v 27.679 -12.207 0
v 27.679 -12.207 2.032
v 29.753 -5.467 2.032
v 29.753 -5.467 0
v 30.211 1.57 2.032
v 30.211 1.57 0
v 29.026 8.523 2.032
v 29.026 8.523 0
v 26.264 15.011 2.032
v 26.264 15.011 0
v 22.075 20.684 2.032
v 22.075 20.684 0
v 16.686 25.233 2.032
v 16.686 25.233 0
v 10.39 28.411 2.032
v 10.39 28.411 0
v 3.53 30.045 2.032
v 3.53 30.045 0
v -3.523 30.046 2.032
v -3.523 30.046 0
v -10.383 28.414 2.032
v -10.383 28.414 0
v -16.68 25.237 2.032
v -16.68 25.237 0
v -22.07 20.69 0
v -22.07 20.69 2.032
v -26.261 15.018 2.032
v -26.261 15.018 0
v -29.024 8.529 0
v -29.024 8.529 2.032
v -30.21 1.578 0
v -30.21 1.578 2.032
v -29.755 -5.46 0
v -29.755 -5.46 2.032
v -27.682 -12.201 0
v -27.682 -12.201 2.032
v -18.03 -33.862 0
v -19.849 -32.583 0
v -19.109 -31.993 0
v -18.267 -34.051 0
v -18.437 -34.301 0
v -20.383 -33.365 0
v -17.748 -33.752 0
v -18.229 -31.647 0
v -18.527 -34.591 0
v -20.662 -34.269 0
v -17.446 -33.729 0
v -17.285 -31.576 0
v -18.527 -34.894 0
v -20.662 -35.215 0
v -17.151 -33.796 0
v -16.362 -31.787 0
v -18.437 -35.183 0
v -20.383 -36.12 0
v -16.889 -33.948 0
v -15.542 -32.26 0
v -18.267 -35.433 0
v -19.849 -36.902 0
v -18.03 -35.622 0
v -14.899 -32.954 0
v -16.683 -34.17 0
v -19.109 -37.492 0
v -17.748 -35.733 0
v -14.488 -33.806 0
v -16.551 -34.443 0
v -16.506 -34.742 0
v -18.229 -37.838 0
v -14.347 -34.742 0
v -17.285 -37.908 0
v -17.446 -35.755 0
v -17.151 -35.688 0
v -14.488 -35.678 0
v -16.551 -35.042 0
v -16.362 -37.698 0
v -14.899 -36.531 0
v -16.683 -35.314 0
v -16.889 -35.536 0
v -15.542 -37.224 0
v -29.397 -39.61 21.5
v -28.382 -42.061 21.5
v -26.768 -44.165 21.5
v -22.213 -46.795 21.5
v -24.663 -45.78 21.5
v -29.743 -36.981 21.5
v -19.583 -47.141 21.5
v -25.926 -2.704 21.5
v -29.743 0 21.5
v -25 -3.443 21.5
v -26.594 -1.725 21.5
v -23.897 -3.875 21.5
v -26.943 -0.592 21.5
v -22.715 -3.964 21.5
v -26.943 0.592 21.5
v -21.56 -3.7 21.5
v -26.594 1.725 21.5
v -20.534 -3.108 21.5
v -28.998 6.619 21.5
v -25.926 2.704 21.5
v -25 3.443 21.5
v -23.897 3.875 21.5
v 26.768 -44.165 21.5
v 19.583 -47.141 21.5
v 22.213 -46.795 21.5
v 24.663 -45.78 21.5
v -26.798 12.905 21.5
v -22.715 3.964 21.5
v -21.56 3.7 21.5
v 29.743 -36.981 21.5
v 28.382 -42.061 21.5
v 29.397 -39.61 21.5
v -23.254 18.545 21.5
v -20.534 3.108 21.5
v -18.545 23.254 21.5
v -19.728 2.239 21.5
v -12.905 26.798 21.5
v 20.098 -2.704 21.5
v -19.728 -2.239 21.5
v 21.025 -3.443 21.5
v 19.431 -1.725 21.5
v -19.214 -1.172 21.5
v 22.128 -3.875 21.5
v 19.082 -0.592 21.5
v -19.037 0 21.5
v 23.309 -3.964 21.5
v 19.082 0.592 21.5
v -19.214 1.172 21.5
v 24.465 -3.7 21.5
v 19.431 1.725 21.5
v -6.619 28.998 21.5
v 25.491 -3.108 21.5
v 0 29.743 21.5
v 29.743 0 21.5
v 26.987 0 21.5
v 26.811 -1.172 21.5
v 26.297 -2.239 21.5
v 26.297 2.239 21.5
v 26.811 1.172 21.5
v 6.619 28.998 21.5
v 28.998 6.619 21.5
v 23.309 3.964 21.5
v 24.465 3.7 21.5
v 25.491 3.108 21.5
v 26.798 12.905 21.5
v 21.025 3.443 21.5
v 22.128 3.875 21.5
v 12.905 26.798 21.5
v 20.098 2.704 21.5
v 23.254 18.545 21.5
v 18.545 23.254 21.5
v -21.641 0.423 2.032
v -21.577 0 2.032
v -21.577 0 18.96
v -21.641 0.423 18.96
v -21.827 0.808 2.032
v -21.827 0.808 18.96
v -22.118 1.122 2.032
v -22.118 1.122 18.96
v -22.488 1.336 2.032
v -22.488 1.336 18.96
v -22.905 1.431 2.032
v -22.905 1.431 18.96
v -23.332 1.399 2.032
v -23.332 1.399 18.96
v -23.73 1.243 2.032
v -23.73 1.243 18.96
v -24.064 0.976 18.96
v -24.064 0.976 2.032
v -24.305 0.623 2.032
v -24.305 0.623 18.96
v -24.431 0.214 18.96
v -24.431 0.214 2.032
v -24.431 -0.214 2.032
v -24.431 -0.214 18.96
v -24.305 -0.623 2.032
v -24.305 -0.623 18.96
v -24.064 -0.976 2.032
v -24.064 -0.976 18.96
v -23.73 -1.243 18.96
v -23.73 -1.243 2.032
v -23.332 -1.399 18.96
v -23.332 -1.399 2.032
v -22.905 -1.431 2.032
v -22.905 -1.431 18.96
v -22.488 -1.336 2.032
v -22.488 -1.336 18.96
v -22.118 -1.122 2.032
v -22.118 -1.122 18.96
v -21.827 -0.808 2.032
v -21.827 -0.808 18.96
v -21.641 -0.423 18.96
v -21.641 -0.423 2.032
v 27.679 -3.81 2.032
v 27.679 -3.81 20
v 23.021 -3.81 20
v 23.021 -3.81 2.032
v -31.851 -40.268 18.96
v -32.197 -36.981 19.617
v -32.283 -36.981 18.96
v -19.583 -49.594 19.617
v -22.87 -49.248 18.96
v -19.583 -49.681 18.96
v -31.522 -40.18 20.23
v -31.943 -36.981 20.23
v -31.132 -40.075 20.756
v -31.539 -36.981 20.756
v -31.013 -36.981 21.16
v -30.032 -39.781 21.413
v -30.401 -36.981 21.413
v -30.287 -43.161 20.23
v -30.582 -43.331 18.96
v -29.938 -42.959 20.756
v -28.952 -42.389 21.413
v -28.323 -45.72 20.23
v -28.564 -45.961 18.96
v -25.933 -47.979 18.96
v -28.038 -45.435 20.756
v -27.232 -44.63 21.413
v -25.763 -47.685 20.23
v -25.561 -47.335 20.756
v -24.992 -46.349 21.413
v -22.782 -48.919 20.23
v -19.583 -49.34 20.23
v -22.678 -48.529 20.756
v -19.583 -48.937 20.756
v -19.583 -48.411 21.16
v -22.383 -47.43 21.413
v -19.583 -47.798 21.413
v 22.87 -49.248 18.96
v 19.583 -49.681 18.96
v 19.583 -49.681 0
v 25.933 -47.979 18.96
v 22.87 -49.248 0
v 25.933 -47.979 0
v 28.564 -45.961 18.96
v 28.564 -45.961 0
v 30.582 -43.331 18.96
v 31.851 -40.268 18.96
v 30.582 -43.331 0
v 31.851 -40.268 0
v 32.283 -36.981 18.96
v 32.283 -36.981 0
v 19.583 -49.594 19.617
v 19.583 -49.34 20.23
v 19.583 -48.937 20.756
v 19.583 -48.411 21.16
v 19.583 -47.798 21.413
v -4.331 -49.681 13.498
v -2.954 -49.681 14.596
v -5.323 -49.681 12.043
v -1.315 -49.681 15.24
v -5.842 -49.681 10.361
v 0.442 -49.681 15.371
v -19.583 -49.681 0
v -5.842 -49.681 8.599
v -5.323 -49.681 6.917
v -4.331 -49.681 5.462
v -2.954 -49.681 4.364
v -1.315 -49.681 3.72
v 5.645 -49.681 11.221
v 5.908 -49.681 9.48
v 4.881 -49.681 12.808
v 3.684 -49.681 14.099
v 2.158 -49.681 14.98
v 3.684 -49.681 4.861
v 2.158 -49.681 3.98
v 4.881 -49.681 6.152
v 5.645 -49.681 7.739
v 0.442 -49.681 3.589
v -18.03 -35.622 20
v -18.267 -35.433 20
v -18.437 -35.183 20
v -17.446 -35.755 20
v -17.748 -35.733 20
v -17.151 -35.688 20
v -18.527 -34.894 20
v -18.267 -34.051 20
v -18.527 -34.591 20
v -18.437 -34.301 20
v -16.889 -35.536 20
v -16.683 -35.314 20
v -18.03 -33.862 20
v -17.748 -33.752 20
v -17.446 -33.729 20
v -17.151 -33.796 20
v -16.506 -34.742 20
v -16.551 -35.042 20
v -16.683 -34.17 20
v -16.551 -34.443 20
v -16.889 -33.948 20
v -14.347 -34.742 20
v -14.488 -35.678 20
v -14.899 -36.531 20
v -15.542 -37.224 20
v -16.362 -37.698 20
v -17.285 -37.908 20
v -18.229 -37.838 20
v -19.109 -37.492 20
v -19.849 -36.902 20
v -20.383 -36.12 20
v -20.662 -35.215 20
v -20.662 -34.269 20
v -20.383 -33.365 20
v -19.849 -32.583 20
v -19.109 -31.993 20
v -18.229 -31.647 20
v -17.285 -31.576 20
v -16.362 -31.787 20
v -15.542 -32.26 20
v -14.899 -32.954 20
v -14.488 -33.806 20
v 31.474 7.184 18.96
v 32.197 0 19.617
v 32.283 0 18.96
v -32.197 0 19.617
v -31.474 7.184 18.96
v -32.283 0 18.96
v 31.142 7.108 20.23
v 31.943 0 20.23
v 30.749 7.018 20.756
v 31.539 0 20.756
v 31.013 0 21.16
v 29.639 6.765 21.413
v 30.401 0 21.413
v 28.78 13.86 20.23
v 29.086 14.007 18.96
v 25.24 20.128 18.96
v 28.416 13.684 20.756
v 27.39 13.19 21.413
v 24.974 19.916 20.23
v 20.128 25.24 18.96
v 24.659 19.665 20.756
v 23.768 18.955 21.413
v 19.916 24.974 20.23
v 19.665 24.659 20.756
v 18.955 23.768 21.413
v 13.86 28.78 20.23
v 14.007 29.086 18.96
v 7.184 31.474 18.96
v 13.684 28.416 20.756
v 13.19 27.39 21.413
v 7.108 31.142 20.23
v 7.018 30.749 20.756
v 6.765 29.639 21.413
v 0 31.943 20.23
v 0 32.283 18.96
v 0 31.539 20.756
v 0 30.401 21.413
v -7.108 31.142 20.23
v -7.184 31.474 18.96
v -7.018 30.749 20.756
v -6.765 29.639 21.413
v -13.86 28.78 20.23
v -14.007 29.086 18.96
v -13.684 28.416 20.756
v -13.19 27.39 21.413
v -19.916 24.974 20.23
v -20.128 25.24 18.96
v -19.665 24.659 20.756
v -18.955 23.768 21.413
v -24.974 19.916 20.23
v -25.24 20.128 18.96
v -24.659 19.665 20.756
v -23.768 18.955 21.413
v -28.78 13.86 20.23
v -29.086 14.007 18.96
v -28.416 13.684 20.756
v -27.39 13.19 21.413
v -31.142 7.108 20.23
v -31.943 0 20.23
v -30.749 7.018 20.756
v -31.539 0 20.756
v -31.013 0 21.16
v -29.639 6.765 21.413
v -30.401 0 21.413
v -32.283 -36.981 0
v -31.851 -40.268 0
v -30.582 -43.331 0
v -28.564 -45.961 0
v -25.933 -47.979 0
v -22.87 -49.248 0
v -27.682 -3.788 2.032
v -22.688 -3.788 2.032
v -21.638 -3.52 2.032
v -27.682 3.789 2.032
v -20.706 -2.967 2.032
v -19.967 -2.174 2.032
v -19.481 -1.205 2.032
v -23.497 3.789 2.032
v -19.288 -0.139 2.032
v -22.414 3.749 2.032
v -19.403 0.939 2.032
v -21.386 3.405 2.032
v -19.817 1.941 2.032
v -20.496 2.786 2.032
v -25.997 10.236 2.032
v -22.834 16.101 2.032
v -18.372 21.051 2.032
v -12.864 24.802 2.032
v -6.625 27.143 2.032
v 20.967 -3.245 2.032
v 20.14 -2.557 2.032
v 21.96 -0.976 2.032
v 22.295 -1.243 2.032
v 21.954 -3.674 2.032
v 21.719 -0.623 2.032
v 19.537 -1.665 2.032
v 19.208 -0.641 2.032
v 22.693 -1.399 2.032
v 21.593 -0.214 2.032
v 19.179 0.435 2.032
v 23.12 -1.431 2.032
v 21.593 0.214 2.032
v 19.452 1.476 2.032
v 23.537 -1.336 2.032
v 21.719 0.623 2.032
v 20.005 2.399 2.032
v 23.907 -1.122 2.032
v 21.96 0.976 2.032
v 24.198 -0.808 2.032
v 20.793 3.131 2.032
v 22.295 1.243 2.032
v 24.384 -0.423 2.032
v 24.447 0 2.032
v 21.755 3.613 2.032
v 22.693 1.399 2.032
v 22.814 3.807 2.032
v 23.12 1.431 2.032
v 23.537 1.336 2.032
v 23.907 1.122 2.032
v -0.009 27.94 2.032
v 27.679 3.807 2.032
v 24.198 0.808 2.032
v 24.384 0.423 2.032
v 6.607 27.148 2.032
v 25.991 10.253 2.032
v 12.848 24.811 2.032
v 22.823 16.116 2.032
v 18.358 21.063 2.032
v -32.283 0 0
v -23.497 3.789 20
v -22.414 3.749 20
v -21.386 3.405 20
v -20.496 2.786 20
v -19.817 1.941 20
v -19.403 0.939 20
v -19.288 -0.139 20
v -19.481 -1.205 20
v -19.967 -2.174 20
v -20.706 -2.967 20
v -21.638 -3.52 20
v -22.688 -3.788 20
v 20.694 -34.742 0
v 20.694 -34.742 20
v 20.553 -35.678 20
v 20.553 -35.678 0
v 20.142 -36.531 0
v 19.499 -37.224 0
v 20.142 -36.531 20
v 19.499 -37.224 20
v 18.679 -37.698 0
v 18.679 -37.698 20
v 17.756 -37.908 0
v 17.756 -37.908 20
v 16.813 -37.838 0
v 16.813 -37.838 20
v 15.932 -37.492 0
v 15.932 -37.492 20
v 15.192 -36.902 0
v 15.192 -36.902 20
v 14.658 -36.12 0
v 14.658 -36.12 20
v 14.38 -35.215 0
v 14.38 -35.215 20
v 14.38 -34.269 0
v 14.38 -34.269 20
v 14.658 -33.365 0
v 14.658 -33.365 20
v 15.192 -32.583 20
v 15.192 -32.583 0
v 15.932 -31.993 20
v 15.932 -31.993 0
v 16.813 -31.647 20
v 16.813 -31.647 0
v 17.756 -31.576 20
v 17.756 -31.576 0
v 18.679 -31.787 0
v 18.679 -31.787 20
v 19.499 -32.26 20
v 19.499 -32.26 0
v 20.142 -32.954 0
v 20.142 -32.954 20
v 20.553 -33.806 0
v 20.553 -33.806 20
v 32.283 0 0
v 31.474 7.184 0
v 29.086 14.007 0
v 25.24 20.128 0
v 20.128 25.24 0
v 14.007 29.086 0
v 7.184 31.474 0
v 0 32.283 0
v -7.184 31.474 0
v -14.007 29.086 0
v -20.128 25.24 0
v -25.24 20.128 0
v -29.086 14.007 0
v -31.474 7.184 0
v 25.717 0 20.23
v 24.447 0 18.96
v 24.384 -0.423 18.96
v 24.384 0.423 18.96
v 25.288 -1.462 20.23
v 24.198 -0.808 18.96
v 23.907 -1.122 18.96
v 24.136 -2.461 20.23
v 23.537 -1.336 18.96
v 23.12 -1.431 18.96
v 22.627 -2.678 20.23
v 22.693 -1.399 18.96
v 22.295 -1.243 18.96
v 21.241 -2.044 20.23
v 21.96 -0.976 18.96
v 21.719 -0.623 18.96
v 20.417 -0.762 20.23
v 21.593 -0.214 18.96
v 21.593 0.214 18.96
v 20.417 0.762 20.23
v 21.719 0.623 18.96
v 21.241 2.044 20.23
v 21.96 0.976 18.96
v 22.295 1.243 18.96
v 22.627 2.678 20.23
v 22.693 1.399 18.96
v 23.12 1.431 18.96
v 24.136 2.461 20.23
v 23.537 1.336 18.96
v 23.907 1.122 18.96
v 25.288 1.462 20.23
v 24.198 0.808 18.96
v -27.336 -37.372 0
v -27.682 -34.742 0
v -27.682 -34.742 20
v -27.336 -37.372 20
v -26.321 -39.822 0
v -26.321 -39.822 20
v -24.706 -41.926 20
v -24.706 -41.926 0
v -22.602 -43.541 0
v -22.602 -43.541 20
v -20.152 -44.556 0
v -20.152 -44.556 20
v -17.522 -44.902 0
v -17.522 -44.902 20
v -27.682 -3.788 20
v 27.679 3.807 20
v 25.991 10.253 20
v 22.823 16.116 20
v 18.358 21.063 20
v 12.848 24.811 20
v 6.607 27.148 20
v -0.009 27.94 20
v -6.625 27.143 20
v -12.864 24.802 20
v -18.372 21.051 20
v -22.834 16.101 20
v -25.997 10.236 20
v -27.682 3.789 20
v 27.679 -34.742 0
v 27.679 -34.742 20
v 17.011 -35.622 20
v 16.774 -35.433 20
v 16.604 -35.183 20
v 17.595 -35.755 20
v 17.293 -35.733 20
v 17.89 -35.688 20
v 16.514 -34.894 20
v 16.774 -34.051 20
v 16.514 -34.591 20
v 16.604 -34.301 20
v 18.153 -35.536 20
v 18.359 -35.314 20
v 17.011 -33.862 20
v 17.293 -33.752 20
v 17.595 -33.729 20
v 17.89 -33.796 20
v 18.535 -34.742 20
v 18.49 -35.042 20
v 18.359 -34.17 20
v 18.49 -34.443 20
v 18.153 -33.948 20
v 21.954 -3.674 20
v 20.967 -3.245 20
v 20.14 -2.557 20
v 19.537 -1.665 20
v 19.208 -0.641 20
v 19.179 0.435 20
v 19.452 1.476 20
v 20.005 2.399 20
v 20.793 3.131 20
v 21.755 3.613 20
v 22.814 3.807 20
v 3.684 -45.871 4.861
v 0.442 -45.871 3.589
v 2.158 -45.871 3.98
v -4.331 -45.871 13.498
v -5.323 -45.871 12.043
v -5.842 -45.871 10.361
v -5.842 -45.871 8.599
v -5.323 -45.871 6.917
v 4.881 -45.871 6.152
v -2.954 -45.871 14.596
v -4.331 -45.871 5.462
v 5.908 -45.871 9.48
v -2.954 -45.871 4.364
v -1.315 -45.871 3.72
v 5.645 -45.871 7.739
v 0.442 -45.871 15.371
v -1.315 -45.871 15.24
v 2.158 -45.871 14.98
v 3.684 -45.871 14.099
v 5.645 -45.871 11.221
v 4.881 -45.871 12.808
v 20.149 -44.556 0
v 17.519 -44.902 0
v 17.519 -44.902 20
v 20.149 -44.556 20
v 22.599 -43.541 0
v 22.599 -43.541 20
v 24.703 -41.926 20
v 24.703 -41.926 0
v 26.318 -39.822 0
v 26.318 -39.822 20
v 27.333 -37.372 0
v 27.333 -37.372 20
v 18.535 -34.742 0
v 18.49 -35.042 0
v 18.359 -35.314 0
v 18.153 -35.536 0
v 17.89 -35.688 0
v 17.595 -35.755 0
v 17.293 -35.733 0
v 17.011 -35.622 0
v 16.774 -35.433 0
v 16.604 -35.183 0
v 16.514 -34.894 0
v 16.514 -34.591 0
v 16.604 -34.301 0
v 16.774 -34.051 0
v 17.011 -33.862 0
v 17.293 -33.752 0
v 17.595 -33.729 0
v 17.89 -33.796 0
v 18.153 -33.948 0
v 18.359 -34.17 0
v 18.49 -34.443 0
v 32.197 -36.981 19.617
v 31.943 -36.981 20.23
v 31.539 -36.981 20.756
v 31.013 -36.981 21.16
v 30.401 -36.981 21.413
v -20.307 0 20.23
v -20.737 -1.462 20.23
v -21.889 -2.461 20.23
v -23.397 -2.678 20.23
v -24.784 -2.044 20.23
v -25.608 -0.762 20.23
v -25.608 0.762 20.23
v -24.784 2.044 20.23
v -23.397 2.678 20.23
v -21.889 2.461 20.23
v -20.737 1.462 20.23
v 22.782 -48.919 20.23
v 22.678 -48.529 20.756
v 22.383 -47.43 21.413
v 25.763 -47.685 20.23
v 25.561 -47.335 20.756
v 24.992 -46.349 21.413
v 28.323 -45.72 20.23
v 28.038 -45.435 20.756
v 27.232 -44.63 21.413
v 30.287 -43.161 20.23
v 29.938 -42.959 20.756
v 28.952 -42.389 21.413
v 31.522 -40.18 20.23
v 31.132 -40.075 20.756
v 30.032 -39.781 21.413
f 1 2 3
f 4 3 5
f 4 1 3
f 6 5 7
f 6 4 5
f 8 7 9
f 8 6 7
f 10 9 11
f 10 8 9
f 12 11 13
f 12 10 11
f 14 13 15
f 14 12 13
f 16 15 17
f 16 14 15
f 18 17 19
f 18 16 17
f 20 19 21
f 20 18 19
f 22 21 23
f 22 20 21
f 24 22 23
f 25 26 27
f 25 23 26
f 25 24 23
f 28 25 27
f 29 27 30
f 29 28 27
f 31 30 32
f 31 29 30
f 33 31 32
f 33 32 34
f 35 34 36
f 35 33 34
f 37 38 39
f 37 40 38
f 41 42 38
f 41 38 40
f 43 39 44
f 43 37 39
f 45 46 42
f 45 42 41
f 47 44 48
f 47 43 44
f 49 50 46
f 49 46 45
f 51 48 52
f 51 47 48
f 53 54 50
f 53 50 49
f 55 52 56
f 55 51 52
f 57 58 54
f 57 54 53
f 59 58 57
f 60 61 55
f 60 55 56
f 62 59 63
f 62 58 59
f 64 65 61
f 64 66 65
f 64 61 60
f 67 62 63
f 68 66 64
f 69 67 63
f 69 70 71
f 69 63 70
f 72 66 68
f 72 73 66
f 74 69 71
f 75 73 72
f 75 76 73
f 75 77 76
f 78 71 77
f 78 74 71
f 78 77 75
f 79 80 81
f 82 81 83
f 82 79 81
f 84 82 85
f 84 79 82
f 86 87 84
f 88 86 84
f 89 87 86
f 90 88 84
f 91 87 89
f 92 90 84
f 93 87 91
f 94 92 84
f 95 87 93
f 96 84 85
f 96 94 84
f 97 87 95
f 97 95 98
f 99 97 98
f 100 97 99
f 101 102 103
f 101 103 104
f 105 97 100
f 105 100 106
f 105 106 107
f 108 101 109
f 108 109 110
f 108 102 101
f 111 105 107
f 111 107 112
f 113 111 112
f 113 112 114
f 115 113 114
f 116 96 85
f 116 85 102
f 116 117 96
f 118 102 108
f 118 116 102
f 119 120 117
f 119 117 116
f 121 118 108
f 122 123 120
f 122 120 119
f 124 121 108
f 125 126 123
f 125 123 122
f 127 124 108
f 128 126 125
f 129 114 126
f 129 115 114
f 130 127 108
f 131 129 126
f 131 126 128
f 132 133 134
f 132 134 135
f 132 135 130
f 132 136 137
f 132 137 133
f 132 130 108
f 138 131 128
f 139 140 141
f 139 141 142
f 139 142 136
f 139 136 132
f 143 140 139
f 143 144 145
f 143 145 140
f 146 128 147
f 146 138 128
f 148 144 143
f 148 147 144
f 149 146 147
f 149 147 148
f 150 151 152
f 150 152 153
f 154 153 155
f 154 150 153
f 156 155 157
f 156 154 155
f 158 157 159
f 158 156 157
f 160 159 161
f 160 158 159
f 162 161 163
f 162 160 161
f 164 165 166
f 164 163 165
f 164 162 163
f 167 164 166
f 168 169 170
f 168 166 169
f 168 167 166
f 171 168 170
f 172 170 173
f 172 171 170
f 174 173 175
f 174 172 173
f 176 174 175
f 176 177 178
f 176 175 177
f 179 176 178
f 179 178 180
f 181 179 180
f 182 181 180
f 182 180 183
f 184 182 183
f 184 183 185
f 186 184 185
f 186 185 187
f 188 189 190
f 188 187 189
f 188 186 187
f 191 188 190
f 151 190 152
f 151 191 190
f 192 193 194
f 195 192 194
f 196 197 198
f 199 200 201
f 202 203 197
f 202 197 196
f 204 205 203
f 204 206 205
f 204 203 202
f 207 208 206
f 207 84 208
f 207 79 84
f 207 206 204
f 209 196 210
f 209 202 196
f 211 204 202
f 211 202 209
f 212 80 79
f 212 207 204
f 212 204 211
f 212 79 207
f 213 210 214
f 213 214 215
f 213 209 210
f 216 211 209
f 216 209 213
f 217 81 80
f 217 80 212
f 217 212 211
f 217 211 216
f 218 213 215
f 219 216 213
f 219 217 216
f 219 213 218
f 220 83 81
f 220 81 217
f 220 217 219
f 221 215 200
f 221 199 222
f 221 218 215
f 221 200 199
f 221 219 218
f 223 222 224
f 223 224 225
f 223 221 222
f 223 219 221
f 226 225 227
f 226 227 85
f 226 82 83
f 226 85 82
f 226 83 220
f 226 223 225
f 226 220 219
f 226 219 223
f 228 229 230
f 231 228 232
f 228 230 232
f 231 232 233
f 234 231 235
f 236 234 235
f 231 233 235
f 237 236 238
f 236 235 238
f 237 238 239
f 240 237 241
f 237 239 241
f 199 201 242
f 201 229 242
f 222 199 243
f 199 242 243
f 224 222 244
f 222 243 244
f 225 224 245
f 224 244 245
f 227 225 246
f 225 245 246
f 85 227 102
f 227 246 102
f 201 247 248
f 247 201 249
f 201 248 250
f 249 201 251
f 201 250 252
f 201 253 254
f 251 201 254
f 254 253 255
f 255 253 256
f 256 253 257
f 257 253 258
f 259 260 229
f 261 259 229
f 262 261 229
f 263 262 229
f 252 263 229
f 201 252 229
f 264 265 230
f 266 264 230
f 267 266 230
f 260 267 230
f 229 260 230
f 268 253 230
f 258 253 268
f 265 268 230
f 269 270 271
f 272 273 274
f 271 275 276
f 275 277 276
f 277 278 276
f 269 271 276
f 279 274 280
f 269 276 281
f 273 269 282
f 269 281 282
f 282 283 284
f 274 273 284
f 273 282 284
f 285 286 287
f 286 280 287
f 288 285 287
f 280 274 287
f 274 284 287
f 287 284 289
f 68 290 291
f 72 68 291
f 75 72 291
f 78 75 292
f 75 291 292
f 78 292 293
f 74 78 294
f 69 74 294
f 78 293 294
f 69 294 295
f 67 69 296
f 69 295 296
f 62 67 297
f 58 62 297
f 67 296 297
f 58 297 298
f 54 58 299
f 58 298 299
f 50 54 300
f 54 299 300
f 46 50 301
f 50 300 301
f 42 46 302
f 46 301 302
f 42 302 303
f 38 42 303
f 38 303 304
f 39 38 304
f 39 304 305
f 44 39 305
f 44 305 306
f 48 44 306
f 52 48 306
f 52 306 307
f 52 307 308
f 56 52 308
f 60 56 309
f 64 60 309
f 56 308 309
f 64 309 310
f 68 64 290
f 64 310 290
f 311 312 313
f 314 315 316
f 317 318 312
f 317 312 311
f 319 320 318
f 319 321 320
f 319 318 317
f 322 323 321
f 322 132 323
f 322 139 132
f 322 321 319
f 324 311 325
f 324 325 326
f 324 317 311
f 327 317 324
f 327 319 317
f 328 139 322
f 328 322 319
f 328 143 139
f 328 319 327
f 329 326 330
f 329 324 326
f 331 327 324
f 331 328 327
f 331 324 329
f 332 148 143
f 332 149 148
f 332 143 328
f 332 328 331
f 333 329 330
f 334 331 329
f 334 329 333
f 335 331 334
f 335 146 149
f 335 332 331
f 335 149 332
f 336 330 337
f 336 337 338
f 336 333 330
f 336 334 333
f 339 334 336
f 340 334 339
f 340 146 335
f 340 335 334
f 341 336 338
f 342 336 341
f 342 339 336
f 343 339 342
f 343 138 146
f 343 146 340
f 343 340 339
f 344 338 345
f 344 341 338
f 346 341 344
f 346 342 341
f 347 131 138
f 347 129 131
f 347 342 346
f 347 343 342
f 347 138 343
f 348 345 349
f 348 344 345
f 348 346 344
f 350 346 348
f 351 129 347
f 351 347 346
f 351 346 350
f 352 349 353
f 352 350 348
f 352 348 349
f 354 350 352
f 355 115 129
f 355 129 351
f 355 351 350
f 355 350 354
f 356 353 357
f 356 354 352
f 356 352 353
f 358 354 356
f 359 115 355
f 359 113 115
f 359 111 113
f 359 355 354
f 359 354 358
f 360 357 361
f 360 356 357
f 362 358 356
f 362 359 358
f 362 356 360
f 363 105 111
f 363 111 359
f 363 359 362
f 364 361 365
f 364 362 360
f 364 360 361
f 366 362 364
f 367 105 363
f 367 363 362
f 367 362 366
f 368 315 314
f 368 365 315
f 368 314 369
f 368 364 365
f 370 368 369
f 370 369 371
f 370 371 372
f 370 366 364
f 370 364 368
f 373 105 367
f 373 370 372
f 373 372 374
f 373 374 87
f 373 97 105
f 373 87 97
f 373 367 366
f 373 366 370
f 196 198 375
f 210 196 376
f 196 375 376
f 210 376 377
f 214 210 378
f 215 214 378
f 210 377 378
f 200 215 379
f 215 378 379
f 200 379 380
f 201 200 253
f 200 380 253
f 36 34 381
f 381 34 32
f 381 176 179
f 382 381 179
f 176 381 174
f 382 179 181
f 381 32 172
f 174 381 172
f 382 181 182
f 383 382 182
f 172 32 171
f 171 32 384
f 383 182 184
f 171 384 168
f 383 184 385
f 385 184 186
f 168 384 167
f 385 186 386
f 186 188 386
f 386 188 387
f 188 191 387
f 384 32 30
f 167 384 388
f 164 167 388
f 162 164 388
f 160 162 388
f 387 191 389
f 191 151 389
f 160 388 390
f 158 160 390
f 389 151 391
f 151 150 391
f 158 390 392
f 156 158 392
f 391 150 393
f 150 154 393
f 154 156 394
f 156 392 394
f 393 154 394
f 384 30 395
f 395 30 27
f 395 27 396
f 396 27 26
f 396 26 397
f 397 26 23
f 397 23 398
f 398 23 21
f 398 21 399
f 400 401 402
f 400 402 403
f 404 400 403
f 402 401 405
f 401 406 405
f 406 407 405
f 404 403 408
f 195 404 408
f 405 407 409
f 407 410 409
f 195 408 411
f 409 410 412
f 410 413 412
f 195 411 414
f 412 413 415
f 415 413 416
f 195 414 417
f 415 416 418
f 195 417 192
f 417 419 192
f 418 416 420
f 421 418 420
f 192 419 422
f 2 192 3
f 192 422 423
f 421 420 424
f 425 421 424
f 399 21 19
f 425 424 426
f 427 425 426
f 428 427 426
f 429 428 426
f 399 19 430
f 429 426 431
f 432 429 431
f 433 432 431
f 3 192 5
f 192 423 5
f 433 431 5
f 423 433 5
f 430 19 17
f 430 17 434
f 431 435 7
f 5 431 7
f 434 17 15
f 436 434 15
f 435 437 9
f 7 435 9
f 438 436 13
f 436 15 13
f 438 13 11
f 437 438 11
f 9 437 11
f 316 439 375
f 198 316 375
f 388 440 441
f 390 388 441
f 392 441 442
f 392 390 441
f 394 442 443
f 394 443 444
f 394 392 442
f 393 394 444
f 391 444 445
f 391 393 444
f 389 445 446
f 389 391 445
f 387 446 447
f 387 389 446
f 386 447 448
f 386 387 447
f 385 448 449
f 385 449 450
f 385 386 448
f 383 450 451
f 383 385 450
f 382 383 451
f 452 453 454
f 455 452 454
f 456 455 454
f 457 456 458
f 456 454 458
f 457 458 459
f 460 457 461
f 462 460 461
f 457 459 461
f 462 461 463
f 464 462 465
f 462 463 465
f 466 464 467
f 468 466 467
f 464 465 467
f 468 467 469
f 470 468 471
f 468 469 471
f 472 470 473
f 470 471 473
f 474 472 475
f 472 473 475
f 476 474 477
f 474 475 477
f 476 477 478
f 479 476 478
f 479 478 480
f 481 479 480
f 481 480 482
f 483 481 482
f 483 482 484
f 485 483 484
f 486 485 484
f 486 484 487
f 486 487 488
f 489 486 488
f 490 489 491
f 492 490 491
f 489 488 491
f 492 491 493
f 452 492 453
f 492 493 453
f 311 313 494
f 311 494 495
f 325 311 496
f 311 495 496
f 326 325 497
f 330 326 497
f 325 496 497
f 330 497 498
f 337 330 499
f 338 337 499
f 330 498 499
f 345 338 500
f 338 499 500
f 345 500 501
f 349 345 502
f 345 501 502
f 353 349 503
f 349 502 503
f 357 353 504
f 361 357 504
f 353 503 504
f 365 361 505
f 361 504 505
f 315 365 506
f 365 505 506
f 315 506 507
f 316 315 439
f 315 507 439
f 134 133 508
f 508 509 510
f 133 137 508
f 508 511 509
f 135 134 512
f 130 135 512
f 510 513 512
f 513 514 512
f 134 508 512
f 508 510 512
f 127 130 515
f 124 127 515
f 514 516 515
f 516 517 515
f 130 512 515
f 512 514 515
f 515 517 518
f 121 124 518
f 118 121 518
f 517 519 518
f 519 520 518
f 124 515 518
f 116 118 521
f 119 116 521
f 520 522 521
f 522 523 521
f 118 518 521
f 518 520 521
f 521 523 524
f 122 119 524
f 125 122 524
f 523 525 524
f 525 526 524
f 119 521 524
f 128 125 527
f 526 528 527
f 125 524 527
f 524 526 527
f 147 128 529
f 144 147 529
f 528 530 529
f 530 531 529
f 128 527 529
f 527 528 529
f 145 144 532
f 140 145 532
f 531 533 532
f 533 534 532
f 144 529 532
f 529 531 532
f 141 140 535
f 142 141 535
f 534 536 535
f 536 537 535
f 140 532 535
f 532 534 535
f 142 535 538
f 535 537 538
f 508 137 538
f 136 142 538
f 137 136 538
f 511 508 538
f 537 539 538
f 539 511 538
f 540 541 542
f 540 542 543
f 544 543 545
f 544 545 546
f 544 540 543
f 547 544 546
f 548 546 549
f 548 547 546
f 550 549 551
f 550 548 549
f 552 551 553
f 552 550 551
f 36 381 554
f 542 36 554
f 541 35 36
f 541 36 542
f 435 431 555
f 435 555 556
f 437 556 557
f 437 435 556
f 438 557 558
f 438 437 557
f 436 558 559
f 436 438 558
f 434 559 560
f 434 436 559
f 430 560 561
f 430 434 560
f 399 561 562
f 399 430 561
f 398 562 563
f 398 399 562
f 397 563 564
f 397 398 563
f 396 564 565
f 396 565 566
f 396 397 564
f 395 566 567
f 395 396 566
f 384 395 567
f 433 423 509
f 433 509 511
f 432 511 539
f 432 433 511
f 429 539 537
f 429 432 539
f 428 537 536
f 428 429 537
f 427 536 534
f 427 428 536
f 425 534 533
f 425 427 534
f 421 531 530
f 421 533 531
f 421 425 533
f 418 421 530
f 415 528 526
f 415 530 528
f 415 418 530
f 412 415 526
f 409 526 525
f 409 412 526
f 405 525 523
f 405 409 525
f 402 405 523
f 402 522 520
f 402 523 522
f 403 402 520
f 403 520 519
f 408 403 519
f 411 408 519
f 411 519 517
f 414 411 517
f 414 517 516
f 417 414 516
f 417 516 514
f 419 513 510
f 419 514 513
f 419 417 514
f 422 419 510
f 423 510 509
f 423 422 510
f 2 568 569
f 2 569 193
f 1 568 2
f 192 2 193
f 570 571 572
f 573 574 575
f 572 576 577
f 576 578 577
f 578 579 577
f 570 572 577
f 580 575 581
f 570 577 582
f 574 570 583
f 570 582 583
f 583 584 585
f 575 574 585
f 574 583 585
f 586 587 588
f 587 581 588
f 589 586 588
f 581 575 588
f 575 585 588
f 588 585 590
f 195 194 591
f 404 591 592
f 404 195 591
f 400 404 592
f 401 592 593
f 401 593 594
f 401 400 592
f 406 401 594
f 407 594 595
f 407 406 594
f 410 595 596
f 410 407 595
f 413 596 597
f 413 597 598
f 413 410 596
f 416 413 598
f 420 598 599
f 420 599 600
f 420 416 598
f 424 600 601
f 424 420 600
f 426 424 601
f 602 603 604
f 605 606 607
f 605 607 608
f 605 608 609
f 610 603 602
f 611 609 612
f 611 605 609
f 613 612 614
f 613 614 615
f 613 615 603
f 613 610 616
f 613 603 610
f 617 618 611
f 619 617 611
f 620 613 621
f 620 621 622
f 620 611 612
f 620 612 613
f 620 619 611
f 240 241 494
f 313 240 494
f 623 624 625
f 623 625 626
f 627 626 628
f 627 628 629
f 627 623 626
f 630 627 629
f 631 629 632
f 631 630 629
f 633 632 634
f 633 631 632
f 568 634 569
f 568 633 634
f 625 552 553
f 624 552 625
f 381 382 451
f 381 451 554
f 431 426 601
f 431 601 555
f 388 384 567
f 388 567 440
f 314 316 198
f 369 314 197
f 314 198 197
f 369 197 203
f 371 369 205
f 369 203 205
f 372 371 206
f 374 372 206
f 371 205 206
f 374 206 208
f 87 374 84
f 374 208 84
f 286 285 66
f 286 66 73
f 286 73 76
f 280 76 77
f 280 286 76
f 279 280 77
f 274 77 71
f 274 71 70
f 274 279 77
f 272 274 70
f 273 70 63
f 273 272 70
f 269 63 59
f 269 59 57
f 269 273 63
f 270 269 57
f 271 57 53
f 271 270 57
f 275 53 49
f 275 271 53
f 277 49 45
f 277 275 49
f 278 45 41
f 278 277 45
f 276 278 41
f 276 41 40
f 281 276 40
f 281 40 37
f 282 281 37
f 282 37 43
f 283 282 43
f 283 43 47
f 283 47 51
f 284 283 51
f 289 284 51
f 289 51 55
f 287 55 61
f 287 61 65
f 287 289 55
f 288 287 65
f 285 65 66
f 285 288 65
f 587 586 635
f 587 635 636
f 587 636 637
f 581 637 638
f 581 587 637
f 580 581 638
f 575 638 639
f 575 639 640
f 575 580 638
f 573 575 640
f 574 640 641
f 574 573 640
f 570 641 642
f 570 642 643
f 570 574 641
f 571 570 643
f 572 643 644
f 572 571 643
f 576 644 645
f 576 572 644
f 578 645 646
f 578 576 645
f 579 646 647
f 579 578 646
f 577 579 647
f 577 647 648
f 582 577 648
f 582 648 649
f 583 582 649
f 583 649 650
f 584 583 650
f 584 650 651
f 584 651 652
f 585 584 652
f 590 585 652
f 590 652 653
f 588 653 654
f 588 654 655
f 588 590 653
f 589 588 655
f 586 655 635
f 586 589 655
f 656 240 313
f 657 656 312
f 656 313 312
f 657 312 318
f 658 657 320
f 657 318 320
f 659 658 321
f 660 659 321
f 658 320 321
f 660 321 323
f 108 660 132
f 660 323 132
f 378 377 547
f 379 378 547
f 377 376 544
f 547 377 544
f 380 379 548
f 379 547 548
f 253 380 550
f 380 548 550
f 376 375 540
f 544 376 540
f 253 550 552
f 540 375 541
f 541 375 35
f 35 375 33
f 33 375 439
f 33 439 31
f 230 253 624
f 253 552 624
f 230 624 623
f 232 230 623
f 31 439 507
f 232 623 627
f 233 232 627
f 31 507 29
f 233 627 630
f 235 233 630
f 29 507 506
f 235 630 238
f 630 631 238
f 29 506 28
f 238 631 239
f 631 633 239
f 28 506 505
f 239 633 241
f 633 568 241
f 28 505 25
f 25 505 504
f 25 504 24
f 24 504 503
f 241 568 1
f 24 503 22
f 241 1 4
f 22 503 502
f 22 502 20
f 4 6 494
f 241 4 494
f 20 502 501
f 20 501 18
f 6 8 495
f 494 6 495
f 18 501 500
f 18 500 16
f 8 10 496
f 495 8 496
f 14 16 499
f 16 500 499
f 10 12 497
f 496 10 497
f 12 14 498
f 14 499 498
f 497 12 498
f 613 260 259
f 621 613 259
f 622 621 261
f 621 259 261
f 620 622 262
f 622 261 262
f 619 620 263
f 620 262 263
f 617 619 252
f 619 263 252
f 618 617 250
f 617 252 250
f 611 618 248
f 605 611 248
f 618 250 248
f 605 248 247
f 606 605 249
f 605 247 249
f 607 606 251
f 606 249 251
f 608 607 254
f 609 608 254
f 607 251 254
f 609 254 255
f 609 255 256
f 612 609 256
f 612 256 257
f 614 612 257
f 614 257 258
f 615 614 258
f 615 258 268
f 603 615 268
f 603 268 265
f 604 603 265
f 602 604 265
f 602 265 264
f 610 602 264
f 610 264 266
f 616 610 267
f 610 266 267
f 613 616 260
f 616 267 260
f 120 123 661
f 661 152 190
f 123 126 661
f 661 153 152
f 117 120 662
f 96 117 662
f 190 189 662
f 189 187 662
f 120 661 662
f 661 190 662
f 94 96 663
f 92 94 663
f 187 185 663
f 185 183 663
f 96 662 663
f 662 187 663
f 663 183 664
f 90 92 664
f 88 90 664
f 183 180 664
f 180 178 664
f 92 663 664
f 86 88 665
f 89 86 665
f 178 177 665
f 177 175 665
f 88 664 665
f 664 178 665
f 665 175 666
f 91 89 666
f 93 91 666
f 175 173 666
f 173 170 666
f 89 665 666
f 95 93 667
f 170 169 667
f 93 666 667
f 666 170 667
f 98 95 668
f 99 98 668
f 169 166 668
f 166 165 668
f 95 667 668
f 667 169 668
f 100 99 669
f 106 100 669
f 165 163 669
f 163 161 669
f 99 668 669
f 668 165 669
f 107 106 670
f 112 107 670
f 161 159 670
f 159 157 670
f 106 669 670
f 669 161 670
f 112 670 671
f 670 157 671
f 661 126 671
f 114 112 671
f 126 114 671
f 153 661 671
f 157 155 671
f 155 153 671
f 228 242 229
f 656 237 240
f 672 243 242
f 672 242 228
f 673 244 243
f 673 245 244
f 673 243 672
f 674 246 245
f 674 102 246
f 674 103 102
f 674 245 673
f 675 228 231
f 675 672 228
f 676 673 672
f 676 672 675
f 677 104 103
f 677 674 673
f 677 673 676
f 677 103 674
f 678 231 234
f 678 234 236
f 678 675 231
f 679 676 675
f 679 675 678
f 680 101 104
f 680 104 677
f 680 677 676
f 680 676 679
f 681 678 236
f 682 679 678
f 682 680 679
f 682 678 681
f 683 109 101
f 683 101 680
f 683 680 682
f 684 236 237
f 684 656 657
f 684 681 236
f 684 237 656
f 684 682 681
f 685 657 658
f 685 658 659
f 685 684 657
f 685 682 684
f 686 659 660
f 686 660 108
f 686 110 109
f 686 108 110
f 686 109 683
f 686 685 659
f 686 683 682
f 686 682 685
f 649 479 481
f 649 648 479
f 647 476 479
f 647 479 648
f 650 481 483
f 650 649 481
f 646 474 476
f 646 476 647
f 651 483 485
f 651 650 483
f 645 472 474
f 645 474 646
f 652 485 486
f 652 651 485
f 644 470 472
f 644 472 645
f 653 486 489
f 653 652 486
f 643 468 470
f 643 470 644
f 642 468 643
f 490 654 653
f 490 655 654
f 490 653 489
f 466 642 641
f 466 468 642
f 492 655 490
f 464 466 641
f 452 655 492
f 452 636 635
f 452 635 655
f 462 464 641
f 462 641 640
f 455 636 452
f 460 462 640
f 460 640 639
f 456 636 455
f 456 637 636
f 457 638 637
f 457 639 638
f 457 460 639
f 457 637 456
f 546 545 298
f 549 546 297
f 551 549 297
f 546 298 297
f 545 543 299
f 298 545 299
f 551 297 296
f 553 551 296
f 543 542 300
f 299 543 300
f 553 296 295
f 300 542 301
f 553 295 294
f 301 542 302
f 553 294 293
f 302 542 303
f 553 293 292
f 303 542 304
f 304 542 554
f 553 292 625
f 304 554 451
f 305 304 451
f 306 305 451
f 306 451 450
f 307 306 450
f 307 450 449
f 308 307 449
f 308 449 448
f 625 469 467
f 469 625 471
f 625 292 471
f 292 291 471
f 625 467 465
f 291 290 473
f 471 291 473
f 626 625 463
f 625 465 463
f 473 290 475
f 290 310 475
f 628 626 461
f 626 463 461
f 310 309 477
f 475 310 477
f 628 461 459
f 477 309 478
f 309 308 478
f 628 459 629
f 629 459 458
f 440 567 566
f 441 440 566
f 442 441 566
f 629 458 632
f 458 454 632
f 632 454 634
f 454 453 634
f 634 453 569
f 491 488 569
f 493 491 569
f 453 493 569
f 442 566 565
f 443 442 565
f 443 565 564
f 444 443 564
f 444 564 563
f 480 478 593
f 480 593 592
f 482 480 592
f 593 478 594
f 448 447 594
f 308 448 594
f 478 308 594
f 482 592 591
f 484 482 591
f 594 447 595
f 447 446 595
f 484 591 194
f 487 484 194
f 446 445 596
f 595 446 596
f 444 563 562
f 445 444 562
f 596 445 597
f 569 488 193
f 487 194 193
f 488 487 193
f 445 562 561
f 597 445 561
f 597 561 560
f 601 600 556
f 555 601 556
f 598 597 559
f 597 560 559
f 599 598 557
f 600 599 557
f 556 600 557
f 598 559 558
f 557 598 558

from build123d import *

# Parameters (mm, degrees)
F1_R      = 7.62
F2_DEPTH  = 8.9916
F3_R      = 3.175
F4_DEPTH  = 18.5
F7_DEPTH  = 21.5
F5_R      = 1.4351
F8_DEPTH  = 25.4
F11_DEPTH = 20
F12_R     = 2.54
F13_SIZE  = 2.54
F6_R      = 30.2514
F14_DEPTH = 2.032
F16_R     = 30.2514
F17_DEPTH = 2.032
F18_R     = 5.9079449729
F19_DEPTH = 3.81
F20_R     = 3.175
F20_R_2   = 1.016
F21_DEPTH = 20


# Not quite as in the source:
# - a feature of the source that left no trace in its solid (it failed there, or was rolled back) is left out
# - a feature names something its author has since deleted; it is built from what else it names


with BuildPart() as f2:
    # F1 (on Top) → F2 (new body)
    with BuildSketch(Plane.XY):
        with BuildLine():
            Line((14.3891, -27.8892), (14.3891, 5.7461149649))
            ThreePointArc((14.3891, 5.7461149649), (0, 15.494), (-14.3891, 5.7461149649))
            Line((-14.3891, 5.7461149649), (-14.3891, -27.8892))
            Line((-14.3891, -27.8892), (14.3891, -27.8892))
        make_face()
        Circle(F1_R, mode=Mode.SUBTRACT)
    extrude(amount=F2_DEPTH)


with BuildPart() as f4:
    # F3 (on Top) → F4 (new body)
    with BuildSketch(Plane.XY):
        Circle(F3_R)
    extrude(amount=F4_DEPTH)


with BuildPart() as f7:
    # F0 (on Top) → F7 (new body)
    with BuildSketch(Plane.XY):
        with BuildLine():
            Line((32.2834, -36.9807843447), (32.2834, 0))
            ThreePointArc((32.2834, 0), (0, 32.2834), (-32.2834, 0))
            Line((-32.2834, 0), (-32.2834, -36.9807843447))
            ThreePointArc((-32.2834, -36.9807843447), (-28.5636561211, -45.9610404657), (-19.5834, -49.6807843447))
            Line((-19.5834, -49.6807843447), (19.5834, -49.6807843447))
            ThreePointArc((19.5834, -49.6807843447), (28.5636561211, -45.9610404657), (32.2834, -36.9807843447))
        make_face()
    extrude(amount=F7_DEPTH)

    # F5 (on Top) → F8 (cut)
    with BuildSketch(Plane.XY):
        with Locations((-23.0124, 0)):
            Circle(F5_R)
        with Locations((23.0124, 0)):
            Circle(F5_R)
    extrude(amount=F8_DEPTH, mode=Mode.SUBTRACT)


with BuildPart() as f11_tool:
    # F10 (on Top) → F11 (new body)
    with BuildSketch(Plane.XY):
        with BuildLine():
            Line((-23.5020610966, -3.7882152164), (-27.6819982204, -3.7882152164))
            ThreePointArc((-27.6819982204, -3.7882152164), (-0.010778614, -27.9399979209), (27.6790671673, -3.8095722529))
            Line((27.6790671673, -3.8095722529), (23.0213215121, -3.8095722529))
            ThreePointArc((23.0213215121, -3.8095722529), (19.1556447136, -0.1037564295), (22.8138242261, 3.8070300236))
            ThreePointArc((22.8138242261, 3.8070300236), (22.9642316699, 3.81), (23.1146391137, 3.8070300236))
            Line((23.1146391137, 3.8070300236), (27.6794169447, 3.8070300236))
            ThreePointArc((27.6794169447, 3.8070300236), (-0.0092095477, 27.9399984822), (-27.6819206668, 3.7887818881))
            Line((-27.6819206668, 3.7887818881), (-23.4967496803, 3.7887818881))
            ThreePointArc((-23.4967496803, 3.7887818881), (-19.3067133937, 0.4041926109), (-22.688364657, -3.7882152164))
            ThreePointArc((-22.688364657, -3.7882152164), (-23.0952128768, -3.81), (-23.5020610966, -3.7882152164))
        make_face()
        with BuildLine():
            ThreePointArc((27.6790671673, -3.8095722529), (-0.010778614, -27.9399979209), (-27.6819982204, -3.7882152164))
            Line((-27.6819982204, -3.7882152164), (-27.6819982204, -34.7421456456))
            ThreePointArc((-27.6819982204, -34.7421456456), (-24.7062031172, -41.9263505425), (-17.5219982204, -44.9021456456))
            Line((-17.5219982204, -44.9021456456), (17.5190671673, -44.9021456456))
            ThreePointArc((17.5190671673, -44.9021456456), (24.7032720641, -41.9263505425), (27.6790671673, -34.7421456456))
            Line((27.6790671673, -34.7421456456), (27.6790671673, -3.8095722529))
        make_face()
        with BuildLine():
            Line((-22.688364657, -3.7882152164), (-23.5020610966, -3.7882152164))
            ThreePointArc((-23.5020610966, -3.7882152164), (-23.0952128768, -3.81), (-22.688364657, -3.7882152164))
        make_face()
        with BuildLine():
            ThreePointArc((23.1146391137, 3.8070300236), (22.9642316699, 3.81), (22.8138242261, 3.8070300236))
            Line((22.8138242261, 3.8070300236), (23.1146391137, 3.8070300236))
        make_face()
    extrude(amount=F11_DEPTH)


with BuildPart() as f2_1:
    add(f2.part)

    # F11: cut by f11_tool
    add(f11_tool.part, mode=Mode.SUBTRACT)


with BuildPart() as f4_1:
    add(f4.part)

    # F11: cut by f11_tool
    add(f11_tool.part, mode=Mode.SUBTRACT)


with BuildPart() as f7_1:
    add(f7.part)

    # F11: cut by f11_tool
    add(f11_tool.part, mode=Mode.SUBTRACT)

    # F12
    f12_edges = [f7_1.edges().sort_by_distance(p)[0] for p in [
        (0, 32.2834, 21.5),
        (32.2834, -18.490392, 21.5),
        (28.563656, -45.96104, 21.5),
        (0, -49.680784, 21.5),
        (-32.2834, -18.490392, 21.5),
        (-28.563656, -45.96104, 21.5),
    ]]
    fillet(f12_edges, radius=F12_R)

    # F13
    f13_edges = [f7_1.edges().sort_by_distance(p)[0] for p in [
        (-24.4475, 0, 21.5),
        (21.5773, 0, 21.5),
    ]]
    chamfer(f13_edges, length=F13_SIZE)

    # F6 (on Top) → F14 (cut)
    with BuildSketch(Plane.XY):
        Circle(F6_R)
    extrude(amount=F14_DEPTH, mode=Mode.SUBTRACT)

    # F16 (on Top) + F6 (on Top) → F17 (cut)
    with BuildSketch(Plane.XY):
        Circle(F16_R)
    with BuildSketch(Plane.XY):
        Circle(F6_R)
    extrude(amount=F17_DEPTH, mode=Mode.SUBTRACT)

    # F18 (on face) → F19 (cut)
    with BuildSketch(Plane.XZ.offset(49.6807843447)):
        with Locations((0, 9.48)):
            Circle(F18_R)
    extrude(amount=-F19_DEPTH, mode=Mode.SUBTRACT)

    # F20 (on face) → F21 (join, through all)
    with BuildSketch(Plane(origin=(0, 0, 20), x_dir=(1, 0, 0), z_dir=(0, 0, -1))):
        with Locations((17.5190671673, 34.7421456456)):
            Circle(F20_R)
        with Locations((17.5190671673, 34.7421456456)):
            Circle(F20_R_2, mode=Mode.SUBTRACT)
        with Locations((-17.5219982204, 34.7421456456)):
            Circle(F20_R)
        with Locations((-17.5219982204, 34.7421456456)):
            Circle(F20_R_2, mode=Mode.SUBTRACT)
    extrude(amount=F21_DEPTH)


solid = f7_1.part
